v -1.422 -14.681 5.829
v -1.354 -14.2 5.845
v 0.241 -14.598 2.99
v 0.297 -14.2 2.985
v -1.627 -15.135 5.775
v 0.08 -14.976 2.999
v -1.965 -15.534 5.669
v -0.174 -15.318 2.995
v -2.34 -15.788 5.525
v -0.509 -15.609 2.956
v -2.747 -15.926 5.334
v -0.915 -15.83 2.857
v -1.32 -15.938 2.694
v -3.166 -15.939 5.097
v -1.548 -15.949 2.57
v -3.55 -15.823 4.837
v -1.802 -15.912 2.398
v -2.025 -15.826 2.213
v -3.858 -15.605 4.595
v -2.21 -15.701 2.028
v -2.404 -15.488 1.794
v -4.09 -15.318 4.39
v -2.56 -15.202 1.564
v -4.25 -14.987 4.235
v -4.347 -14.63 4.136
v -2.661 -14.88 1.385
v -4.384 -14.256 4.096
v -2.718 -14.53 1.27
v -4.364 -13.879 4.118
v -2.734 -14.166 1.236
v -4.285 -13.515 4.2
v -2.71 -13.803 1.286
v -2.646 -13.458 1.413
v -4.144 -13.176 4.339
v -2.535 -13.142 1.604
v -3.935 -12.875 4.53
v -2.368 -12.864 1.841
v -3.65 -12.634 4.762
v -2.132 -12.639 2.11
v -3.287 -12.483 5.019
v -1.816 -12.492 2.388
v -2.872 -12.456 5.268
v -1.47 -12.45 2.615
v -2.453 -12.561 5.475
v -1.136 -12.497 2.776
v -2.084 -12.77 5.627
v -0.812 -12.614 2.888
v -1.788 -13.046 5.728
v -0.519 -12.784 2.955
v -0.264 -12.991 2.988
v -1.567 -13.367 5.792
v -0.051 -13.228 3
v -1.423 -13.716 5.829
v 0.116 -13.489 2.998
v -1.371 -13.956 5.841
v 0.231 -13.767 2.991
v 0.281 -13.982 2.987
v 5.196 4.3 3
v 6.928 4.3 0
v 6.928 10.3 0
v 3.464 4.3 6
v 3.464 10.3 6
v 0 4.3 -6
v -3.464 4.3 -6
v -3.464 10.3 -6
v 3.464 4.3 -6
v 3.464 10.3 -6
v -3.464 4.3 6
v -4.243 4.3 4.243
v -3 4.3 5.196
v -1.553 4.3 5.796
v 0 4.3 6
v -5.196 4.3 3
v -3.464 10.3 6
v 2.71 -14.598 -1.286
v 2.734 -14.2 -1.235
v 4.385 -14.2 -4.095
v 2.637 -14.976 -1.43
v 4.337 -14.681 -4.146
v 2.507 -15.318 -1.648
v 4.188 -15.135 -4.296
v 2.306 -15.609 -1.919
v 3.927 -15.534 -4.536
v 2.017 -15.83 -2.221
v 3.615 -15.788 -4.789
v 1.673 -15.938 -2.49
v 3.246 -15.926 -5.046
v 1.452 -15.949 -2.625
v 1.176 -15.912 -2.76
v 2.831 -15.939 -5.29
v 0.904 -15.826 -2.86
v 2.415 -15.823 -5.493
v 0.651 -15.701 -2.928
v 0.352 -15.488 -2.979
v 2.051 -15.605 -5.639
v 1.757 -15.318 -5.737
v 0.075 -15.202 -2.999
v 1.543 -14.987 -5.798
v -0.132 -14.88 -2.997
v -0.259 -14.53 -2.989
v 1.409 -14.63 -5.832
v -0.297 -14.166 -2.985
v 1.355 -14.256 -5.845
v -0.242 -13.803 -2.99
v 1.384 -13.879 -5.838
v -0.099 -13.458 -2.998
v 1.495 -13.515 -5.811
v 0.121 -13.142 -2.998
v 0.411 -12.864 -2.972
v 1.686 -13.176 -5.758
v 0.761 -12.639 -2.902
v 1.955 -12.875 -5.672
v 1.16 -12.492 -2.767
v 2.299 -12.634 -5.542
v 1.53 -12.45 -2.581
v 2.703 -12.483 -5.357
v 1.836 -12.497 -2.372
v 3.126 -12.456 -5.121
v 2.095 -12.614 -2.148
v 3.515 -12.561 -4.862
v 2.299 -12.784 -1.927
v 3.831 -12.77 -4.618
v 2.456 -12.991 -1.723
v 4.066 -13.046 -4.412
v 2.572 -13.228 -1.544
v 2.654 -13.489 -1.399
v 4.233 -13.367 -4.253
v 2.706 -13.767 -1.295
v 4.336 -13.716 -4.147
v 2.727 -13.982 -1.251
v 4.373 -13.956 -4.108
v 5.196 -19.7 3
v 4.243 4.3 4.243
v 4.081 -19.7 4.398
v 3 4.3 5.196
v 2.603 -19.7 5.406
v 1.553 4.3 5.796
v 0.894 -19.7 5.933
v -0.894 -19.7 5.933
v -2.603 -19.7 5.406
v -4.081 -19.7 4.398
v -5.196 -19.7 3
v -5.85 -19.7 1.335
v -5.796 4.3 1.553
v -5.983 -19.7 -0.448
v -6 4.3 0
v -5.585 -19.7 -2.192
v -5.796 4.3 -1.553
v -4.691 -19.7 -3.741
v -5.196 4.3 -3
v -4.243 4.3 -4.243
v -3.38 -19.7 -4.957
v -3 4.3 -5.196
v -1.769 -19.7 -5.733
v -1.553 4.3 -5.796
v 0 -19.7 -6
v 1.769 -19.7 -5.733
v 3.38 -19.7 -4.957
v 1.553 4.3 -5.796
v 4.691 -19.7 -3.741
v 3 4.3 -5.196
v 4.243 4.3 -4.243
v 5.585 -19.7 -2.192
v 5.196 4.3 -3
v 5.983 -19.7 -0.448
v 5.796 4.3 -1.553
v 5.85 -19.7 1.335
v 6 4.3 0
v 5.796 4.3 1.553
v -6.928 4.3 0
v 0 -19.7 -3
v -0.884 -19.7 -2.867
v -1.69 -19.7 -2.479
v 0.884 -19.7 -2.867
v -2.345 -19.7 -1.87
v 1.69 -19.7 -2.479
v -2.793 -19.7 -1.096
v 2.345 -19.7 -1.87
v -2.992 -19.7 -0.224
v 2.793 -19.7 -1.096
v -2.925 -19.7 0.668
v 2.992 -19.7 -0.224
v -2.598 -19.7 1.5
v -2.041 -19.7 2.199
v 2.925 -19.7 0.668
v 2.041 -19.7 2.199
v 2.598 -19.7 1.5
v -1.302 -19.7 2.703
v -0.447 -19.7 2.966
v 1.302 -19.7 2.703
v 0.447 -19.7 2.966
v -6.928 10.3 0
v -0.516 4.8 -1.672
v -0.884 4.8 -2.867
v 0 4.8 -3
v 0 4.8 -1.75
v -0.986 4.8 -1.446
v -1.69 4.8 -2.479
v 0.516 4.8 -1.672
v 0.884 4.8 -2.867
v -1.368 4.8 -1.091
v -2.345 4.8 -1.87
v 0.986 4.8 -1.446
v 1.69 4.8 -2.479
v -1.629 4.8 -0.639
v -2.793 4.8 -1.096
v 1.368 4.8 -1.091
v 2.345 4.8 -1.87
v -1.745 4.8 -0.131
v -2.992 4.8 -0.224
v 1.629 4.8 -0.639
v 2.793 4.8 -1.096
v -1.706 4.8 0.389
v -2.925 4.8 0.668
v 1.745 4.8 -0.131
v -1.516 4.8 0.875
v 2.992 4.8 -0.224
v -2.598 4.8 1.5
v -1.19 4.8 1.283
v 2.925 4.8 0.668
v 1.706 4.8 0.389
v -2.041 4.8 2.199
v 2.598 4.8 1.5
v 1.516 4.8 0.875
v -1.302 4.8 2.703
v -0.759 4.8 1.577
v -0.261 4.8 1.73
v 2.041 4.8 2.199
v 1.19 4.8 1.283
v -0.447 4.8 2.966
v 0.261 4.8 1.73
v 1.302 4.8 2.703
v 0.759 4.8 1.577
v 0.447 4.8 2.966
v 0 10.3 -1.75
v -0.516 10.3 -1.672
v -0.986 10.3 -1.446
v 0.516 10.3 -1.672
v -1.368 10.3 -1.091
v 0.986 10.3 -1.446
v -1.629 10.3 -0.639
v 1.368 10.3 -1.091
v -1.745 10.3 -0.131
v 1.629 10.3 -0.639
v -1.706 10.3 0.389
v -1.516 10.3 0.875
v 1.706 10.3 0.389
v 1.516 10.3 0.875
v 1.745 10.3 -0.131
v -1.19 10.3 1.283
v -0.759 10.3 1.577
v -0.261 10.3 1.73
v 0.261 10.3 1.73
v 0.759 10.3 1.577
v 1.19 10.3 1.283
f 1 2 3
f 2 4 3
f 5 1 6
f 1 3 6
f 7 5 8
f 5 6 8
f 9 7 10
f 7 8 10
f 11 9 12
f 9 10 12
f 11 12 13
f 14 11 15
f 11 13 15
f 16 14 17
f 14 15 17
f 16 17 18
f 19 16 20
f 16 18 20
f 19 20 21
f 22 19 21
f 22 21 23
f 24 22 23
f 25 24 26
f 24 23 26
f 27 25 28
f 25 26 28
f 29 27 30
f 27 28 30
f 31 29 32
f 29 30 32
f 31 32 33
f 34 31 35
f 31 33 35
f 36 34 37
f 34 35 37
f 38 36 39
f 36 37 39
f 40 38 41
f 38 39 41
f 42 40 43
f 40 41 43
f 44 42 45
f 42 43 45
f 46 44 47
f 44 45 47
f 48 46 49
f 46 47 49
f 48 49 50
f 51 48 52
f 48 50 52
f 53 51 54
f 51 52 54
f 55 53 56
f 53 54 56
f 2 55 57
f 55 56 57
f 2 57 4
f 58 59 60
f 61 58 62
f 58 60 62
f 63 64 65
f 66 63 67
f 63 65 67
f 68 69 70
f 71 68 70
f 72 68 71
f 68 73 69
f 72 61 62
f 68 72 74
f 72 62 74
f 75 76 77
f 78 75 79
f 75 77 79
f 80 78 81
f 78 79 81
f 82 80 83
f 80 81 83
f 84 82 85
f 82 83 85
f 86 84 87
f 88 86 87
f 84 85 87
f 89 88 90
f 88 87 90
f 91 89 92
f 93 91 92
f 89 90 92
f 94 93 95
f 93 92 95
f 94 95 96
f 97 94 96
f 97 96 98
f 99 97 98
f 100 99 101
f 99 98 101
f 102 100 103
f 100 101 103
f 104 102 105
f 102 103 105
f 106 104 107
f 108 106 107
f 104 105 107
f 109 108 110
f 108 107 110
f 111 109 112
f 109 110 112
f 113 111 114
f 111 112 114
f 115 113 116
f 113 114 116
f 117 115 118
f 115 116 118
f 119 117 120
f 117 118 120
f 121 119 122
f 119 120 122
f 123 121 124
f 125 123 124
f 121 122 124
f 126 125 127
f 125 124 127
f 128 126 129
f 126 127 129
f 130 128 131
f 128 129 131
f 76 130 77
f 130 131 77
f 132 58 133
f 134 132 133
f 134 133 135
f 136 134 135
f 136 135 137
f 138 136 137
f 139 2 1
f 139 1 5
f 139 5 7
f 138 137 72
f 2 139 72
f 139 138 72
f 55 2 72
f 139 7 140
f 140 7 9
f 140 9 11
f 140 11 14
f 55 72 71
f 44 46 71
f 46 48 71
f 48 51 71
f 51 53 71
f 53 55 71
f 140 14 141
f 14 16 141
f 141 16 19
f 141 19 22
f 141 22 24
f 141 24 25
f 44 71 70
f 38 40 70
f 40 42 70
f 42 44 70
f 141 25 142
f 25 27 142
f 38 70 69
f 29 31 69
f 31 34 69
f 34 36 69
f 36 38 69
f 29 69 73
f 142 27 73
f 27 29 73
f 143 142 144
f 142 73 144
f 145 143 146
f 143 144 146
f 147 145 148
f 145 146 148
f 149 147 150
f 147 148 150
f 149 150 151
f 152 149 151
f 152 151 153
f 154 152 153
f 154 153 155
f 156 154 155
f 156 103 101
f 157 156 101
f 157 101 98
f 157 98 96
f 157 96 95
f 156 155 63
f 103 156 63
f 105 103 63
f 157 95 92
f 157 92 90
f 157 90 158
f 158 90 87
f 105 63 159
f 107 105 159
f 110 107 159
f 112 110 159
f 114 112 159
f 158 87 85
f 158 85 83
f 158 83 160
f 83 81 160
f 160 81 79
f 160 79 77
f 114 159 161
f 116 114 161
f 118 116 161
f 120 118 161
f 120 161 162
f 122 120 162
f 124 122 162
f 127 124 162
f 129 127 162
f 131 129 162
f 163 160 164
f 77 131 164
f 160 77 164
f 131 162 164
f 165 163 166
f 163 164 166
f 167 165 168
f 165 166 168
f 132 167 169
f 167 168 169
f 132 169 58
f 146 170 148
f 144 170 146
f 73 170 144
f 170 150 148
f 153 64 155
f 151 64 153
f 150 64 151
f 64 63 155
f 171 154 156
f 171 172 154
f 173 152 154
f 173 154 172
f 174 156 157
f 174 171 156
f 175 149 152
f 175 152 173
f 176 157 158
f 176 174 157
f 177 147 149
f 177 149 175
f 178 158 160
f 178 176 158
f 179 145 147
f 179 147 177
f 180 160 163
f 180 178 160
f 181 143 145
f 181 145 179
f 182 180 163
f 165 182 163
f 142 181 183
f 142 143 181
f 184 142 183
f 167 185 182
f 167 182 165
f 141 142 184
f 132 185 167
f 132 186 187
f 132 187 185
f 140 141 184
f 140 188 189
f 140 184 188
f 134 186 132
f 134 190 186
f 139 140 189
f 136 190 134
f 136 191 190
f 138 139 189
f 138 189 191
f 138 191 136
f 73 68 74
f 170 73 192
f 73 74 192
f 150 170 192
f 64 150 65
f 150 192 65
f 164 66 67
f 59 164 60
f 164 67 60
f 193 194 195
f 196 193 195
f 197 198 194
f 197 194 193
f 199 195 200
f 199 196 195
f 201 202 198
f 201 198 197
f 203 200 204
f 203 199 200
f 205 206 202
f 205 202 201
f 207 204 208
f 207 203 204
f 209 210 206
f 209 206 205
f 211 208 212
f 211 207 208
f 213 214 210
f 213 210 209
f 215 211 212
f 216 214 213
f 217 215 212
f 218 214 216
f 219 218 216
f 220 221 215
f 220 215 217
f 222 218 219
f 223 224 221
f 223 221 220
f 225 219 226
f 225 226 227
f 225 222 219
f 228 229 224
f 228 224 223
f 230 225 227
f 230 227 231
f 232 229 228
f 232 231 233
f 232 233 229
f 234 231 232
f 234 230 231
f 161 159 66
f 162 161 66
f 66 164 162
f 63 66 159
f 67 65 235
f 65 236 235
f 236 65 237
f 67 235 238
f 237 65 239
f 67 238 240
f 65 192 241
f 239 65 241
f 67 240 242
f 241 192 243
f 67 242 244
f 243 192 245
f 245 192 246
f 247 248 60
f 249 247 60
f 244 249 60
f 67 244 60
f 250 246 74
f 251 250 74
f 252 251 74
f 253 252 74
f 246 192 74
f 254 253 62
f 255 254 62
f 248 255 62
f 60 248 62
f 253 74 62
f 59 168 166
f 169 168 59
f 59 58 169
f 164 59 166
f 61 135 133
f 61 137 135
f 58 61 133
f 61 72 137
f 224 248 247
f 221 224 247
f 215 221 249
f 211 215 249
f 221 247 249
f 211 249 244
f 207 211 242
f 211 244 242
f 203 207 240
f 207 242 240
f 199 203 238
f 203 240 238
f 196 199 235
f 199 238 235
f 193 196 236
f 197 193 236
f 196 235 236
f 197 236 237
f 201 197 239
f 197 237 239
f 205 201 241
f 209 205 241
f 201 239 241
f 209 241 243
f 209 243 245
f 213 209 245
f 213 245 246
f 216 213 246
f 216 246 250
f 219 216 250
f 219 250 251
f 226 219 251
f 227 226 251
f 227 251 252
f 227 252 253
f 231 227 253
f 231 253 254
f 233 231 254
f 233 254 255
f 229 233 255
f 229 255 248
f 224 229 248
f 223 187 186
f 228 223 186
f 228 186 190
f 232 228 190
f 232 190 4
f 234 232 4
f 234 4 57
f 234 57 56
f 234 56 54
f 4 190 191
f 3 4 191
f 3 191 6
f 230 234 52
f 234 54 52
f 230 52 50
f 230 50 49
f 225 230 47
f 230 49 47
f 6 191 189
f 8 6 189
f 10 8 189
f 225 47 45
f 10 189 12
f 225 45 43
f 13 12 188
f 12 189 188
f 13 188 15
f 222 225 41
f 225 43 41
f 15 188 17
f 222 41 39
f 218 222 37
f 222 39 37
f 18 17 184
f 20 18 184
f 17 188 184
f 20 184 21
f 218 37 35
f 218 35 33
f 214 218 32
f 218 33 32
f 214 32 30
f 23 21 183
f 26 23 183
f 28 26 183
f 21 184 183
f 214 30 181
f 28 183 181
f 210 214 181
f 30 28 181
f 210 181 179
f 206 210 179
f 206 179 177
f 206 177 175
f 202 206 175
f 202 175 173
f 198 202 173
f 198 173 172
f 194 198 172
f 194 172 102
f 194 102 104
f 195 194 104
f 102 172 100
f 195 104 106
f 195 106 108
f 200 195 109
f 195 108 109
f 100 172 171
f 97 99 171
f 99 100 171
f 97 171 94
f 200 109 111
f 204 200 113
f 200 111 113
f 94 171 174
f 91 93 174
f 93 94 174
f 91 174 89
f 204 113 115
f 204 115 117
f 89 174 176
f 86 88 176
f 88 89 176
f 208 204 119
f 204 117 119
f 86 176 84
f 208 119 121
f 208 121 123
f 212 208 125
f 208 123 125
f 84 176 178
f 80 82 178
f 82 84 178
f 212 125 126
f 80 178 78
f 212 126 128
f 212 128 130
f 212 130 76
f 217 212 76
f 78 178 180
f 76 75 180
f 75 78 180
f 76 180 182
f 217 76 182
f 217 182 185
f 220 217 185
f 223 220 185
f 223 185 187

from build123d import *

# Parameters (mm, degrees)
PAD122_DEPTH            = 6
SKETCH186_R             = 6
PAD123_DEPTH            = 24
SKETCH187_R             = 3
POCKET046_DEPTH         = 24.5
SKETCH188_R             = 1.75
POCKET047_DEPTH         = 6
SKETCH189_R             = 1.75
POCKET048_DEPTH         = 7
BODY102_ROLL_ANGLE      = 90.00003
BODY102_PITCH_ANGLE     = -30.000033
BODY102_PLACEMENT_ANGLE = -8e-06


with BuildPart() as part:
    # Sketch185 → Pad122 (new body)
    with BuildSketch(Plane.XY):
        Polygon((6, 3.464102), (0, 6.928203), (-6, 3.464102), (-6, -3.464102), (0, -6.928203), (6, -3.464102), align=None)
    extrude(amount=PAD122_DEPTH)

    # Sketch186 (on Face8 of Pad122) → Pad123 (join)
    with BuildSketch(Plane.XY.offset(6)):
        Circle(SKETCH186_R)
    extrude(amount=PAD123_DEPTH)

    # Sketch187 (on Face15 of Pad123) → Pocket046 (cut)
    with BuildSketch(Plane.XY.offset(30)):
        Circle(SKETCH187_R)
    extrude(amount=-POCKET046_DEPTH, mode=Mode.SUBTRACT)

    # Sketch188 (on Face4 of Pocket046) → Pocket047 (cut)
    with BuildSketch(Plane(origin=(0, 0, 0), x_dir=(1, 0, 0), z_dir=(0, 0, -1))):
        Circle(SKETCH188_R)
    extrude(amount=-POCKET047_DEPTH, mode=Mode.SUBTRACT)

    # Sketch189 → Pocket048 (cut, symmetric)
    with BuildSketch(Plane.XZ):
        with Locations((0, 24.5)):
            Circle(SKETCH189_R)
    extrude(amount=POCKET048_DEPTH, both=True, mode=Mode.SUBTRACT)


with BuildPart() as part_1:
    # Body102 roll: moved
    add(part.part.rotate(Axis((0, 0, 0), (1, 0, 0)), BODY102_ROLL_ANGLE))


with BuildPart() as part_2:
    # Body102 pitch: moved
    add(part_1.part.rotate(Axis((0, 0, 0), (0, 1, 0)), BODY102_PITCH_ANGLE))


with BuildPart() as part_3:
    # Body102 placement: moved
    add(part_2.part.moved(Location((0, 10.3, 0))).rotate(Axis((0, 10.3, 0), (0, 0, 1)), BODY102_PLACEMENT_ANGLE))


solid = part_3.part
